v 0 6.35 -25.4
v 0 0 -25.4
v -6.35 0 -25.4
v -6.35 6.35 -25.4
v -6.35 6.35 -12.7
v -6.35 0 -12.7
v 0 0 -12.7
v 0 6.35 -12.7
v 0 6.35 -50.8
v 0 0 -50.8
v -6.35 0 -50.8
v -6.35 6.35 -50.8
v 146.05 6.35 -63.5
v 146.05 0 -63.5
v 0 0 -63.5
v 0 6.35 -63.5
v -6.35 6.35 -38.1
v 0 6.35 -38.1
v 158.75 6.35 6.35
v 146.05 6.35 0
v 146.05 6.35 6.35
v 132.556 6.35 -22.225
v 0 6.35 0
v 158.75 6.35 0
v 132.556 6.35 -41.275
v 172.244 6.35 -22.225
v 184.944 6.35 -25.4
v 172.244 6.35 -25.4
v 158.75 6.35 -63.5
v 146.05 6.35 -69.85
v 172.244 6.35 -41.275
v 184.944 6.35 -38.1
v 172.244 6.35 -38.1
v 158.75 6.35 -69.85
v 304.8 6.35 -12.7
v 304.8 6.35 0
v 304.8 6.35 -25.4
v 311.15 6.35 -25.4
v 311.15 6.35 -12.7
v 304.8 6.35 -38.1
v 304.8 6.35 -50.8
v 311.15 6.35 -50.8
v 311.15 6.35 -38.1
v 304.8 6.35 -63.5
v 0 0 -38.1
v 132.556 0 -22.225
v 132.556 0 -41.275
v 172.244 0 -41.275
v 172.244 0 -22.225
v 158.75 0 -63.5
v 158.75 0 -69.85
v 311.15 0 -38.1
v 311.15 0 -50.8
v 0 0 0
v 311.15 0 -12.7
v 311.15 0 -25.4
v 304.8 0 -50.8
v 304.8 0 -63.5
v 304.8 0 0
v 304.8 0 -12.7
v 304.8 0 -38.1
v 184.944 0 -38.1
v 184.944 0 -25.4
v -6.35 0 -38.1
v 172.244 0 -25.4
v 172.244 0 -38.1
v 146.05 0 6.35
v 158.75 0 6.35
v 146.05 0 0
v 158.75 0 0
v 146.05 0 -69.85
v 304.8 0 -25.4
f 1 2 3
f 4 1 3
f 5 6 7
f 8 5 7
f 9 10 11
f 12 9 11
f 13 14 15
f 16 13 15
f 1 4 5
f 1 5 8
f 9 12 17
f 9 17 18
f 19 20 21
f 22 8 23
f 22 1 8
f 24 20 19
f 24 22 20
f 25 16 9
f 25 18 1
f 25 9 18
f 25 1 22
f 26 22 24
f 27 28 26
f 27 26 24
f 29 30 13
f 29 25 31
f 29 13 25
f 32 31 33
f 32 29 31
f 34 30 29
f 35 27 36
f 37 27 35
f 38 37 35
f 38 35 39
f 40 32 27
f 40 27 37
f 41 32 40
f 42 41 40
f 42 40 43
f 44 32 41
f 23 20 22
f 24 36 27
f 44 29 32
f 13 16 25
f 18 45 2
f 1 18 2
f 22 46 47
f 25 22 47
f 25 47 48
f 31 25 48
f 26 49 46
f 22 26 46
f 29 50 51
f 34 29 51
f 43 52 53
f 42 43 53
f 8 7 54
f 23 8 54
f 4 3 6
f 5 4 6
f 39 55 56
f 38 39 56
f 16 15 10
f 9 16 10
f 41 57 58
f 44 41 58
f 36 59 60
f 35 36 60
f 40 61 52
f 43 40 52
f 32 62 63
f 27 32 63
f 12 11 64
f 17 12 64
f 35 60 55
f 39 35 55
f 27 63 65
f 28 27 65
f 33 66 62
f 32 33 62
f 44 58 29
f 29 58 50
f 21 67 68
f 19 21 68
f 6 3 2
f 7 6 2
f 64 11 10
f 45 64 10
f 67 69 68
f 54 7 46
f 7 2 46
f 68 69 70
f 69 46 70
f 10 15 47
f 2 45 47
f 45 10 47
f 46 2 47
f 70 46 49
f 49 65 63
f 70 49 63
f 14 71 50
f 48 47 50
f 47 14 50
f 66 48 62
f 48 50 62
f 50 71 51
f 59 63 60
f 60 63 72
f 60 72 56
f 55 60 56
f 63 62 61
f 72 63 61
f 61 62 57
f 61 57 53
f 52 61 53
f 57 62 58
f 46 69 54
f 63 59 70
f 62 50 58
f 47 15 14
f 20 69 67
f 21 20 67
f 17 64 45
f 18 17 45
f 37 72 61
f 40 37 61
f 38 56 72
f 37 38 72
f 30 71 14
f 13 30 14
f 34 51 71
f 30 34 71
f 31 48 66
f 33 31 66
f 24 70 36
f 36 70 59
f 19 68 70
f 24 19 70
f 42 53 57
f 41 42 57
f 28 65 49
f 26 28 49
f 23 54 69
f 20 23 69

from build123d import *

# Parameters (mm, degrees)
BOSS_EXTRUDE1_DEPTH = 6.35


with BuildPart() as part:
    # Sketch1 → Boss-Extrude1 (new body)
    with BuildSketch(Plane(origin=(0, 0, 0), x_dir=(1, 0, 0), z_dir=(0, 1, 0))):
        Polygon((0, 0), (146.05, 0), (146.05, -6.35), (158.75, -6.35), (158.75, 0), (304.8, 0), (304.8, 12.7), (311.15, 12.7), (311.15, 25.4), (304.8, 25.4), (304.8, 38.1), (311.15, 38.1), (311.15, 50.8), (304.8, 50.8), (304.8, 63.5), (158.75, 63.5), (158.75, 69.85), (146.05, 69.85), (146.05, 63.5), (0, 63.5), (0, 50.8), (-6.35, 50.8), (-6.35, 38.1), (0, 38.1), (0, 25.4), (-6.35, 25.4), (-6.35, 12.7), (0, 12.7), align=None)
        Polygon((132.55625, 22.225), (132.55625, 41.275), (172.24375, 41.275), (172.24375, 38.1), (184.94375, 38.1), (184.94375, 25.4), (172.24375, 25.4), (172.24375, 22.225), align=None, mode=Mode.SUBTRACT)
    extrude(amount=BOSS_EXTRUDE1_DEPTH)


solid = part.part
